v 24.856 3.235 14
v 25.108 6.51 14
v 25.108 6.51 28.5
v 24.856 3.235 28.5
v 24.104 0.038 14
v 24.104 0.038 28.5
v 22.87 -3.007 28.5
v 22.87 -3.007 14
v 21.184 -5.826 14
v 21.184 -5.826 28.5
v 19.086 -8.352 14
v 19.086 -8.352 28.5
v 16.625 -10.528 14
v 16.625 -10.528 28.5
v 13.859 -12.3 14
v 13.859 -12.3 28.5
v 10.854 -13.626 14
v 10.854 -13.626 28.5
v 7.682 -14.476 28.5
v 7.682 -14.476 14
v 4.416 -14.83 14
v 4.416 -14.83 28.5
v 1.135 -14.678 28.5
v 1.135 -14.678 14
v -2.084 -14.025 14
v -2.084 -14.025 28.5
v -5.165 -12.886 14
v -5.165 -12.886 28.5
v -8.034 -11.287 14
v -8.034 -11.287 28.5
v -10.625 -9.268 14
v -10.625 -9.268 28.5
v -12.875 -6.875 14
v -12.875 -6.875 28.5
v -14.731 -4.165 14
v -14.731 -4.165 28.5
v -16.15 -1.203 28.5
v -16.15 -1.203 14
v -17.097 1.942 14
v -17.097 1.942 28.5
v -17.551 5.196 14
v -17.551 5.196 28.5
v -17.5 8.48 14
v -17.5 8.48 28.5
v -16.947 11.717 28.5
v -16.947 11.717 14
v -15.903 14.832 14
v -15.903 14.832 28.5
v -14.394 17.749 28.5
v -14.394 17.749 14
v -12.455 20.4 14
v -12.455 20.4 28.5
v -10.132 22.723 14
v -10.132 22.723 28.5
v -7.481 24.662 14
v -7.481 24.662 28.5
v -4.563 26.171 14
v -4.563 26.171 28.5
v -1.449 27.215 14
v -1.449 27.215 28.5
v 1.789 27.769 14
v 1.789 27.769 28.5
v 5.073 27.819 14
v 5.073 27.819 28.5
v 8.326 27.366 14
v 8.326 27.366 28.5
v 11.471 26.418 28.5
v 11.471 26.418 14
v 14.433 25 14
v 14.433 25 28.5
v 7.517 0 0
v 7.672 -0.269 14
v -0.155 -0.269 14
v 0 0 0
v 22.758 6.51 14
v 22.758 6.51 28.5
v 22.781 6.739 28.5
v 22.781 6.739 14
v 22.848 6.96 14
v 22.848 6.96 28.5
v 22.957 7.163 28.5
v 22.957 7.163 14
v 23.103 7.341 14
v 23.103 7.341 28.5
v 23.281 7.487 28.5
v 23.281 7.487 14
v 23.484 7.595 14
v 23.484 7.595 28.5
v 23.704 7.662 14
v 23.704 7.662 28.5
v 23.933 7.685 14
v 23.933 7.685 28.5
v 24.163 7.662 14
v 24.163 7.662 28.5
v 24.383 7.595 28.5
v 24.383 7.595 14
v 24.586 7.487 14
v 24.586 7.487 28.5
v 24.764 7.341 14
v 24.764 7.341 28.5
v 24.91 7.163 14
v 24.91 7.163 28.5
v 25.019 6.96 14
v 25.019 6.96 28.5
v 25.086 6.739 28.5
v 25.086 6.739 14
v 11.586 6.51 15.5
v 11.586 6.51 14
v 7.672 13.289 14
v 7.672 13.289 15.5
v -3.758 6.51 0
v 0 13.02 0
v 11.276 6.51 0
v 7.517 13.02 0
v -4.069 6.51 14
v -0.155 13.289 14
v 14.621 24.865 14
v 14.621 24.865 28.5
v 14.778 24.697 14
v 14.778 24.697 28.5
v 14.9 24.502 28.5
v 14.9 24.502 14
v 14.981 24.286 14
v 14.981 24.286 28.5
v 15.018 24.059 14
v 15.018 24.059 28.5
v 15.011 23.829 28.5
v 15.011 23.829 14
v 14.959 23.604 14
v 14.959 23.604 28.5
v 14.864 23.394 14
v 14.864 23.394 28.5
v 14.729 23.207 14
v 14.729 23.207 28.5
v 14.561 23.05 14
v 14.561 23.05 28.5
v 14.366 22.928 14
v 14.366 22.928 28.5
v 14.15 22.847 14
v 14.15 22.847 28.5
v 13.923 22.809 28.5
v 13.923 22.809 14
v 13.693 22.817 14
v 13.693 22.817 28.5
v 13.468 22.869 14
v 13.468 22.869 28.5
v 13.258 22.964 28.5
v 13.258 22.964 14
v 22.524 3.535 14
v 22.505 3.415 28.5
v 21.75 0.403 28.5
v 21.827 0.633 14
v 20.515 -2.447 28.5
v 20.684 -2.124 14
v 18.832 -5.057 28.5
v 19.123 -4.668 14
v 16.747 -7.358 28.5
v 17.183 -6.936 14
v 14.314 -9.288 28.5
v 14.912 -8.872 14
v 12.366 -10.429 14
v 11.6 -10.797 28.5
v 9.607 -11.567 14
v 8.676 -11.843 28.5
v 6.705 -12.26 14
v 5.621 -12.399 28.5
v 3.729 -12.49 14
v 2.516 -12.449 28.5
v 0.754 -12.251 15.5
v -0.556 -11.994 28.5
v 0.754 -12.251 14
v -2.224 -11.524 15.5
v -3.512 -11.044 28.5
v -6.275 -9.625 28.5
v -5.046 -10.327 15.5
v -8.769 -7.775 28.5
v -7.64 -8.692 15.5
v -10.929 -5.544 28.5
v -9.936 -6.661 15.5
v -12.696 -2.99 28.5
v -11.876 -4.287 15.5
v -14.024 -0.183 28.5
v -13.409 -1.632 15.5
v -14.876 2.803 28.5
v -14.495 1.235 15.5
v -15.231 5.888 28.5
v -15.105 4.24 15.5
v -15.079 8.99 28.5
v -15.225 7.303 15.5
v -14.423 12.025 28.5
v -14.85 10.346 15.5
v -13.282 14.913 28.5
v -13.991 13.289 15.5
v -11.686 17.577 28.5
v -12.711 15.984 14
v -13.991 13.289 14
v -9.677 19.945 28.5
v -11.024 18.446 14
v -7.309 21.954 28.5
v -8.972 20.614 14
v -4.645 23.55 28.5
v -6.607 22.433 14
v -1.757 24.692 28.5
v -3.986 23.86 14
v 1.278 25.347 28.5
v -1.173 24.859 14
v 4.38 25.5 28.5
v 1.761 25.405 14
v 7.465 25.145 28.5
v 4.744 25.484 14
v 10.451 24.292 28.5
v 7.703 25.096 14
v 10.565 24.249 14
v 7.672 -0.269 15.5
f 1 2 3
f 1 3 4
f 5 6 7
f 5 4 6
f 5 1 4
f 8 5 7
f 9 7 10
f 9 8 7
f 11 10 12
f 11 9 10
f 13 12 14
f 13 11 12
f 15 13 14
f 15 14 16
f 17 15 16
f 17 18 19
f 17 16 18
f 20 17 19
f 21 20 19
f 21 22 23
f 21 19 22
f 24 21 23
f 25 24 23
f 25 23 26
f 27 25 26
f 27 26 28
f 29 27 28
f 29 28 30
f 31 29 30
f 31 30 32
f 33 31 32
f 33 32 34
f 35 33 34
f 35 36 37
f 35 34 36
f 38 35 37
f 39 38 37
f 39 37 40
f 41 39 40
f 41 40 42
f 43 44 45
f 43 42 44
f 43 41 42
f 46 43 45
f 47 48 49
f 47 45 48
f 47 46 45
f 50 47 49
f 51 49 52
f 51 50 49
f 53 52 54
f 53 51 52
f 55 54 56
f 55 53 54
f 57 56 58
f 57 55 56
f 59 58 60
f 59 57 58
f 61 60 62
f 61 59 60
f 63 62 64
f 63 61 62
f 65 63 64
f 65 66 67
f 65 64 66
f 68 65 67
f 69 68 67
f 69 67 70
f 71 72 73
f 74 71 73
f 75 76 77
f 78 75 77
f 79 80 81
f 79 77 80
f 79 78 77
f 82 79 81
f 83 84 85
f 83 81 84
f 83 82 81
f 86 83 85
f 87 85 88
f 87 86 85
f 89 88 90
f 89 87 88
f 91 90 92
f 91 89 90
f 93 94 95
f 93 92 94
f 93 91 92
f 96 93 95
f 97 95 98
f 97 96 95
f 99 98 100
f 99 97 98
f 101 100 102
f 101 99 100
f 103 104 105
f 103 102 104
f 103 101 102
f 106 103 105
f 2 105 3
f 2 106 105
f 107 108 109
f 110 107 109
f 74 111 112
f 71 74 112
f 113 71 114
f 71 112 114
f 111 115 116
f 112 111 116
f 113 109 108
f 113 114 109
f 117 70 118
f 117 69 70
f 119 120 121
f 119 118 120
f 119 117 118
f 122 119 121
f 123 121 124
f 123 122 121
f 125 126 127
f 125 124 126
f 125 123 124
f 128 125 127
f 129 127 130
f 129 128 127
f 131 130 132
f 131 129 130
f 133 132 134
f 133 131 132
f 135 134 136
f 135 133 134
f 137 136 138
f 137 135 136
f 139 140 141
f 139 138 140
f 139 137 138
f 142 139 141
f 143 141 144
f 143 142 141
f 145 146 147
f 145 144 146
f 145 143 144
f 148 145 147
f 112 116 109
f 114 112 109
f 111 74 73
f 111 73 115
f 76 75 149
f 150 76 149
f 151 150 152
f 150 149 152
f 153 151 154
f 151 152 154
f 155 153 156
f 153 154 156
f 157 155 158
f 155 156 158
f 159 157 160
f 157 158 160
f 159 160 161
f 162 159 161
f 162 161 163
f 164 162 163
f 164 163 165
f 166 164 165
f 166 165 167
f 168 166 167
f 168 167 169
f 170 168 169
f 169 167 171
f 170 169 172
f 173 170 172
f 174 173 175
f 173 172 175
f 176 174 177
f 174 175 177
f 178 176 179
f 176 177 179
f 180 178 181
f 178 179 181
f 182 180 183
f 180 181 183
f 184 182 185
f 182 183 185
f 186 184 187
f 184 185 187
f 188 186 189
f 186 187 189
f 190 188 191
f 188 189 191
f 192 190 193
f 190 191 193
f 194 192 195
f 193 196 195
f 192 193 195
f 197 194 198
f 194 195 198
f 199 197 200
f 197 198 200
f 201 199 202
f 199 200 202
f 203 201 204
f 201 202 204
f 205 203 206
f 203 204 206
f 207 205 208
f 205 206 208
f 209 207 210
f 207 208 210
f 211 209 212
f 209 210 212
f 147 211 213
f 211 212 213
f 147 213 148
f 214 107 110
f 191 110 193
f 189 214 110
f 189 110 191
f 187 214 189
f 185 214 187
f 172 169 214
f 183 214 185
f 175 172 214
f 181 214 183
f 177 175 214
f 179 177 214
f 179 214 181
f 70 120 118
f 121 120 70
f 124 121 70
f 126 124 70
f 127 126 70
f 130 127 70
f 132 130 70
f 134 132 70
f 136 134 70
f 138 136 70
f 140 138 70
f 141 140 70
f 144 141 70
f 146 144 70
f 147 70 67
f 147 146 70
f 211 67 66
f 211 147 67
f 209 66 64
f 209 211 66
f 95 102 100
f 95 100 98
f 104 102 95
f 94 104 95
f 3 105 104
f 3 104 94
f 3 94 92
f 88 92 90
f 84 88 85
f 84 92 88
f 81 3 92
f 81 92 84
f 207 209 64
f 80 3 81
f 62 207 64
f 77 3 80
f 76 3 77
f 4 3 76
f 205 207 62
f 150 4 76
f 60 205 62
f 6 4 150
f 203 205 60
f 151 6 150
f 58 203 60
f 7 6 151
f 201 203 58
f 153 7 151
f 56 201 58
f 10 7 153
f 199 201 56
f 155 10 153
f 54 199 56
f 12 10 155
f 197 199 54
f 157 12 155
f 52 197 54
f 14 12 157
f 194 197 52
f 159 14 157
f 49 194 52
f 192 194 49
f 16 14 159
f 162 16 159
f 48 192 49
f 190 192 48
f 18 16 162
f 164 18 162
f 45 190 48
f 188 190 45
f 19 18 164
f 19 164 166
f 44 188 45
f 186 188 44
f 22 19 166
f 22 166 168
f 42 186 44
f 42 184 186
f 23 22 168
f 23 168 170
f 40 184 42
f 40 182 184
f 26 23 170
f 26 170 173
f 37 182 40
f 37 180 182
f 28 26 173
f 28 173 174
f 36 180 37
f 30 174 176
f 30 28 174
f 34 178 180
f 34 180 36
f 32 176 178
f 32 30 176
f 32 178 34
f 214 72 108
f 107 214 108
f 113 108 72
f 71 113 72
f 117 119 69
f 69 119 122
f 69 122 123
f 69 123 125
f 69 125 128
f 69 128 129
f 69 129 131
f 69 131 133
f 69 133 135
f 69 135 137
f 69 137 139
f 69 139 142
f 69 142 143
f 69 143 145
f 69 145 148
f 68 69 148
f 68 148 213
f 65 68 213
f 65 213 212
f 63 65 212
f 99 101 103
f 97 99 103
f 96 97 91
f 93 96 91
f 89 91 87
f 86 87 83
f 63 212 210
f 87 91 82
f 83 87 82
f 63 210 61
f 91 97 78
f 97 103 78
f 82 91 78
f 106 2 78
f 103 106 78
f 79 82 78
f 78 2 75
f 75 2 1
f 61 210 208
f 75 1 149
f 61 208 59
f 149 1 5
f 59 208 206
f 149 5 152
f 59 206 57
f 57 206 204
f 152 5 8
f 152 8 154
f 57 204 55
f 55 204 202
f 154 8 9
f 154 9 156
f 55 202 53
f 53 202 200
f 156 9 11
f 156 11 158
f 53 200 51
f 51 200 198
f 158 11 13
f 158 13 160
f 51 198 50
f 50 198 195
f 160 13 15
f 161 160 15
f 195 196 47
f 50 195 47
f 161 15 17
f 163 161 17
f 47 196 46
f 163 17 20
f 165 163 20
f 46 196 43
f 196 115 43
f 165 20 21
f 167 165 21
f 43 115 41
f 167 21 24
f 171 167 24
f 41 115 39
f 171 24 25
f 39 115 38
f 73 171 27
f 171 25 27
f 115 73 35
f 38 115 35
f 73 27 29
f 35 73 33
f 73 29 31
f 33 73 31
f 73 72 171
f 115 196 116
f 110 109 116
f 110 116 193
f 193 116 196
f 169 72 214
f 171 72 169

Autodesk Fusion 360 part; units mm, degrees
sketch "Sketch1" plane through (0, 0, 0) normal (0, 0, 1) x (1, 0, 0)
  line L0 (0, 0) -> (-3.7585, 6.5099)
  line L1 (-3.7585, 6.5099) -> (0, 13.0198)
  line L2 (0, 13.0198) -> (7.517, 13.0198)
  line L3 (7.517, 13.0198) -> (11.2755, 6.5099)
  line L4 (11.2755, 6.5099) -> (7.517, 0)
  line L5 (7.517, 0) -> (0, 0)
  dimension "d1" = 120
  dimension "d2" = 120
  dimension "d3" = 7.517
  dimension "d4" = 7.517
  dimension "d5" = 7.517
  dimension "d6" = 7.517
extrude "Extrude1" add sketch "Sketch1" along normal blind 14 draft 1.1
sketch "Sketch2" plane through (0, 0, 14) normal (0, 0, 1) x (-1, 0, 0)
  line L0 (0.1552, 0.2688) -> (-7.6722, 0.2688)
  line L1 (-7.6722, 0.2688) -> (-11.5859, -6.5099)
  line L2 (-11.5859, -6.5099) -> (-7.6722, -13.2886)
  line L3 (-7.6722, -13.2886) -> (0.1552, -13.2886)
  line L4 (0.1552, -13.2886) -> (4.0689, -6.5099)
  line L5 (4.0689, -6.5099) -> (0.1552, 0.2688)
  line L6 (0.1552, -13.2886) -> (-7.6722, 0.2688)
  line L7 (4.0689, -6.5099) -> (-11.5859, -6.5099)
  line L8 (-7.6722, -13.2886) -> (0.1552, 0.2688)
  circle A0 centre (-3.7585, -6.5099) radius 19
  circle A1 centre (-3.7585, -6.5099) radius 21.3499
  line L9 (5.0153, -25.9737) -> (5.8455, -26.0477)
  line L10 (4.3962, -24.2552) -> (5.1351, -23.2999)
  line L11 (-3.7585, -6.5099) -> (-3.7585, -7)
  line L12 (-13.3271, -26.7079) -> (-13.2828, -26.7025)
  line L13 (-12.3737, -24.5944) -> (-12.4136, -24.5402)
  line L14 (-3.7585, -6.5099) -> (-25.1084, -6.5099)
  line L15 (-3.7585, -6.5099) -> (-14.4334, -24.9995)
  arc A2 (-13.2585, -22.9644) -> (-14.4334, -24.9995) centre (-13.846, -23.9819) ccw
  arc A3 (-25.1084, -6.5099) -> (-22.7585, -6.5099) centre (-23.9334, -6.5099) ccw
  line L16 (-11.5859, -6.5099) -> (-0.7542, 12.2511)
  line L17 (-7.6722, -13.2886) -> (13.9911, -13.2886)
  dimension "d9" = 38
  dimension "d10" = 2.3499
extrude "Extrude2" add sketch "Sketch2" along normal blind 1.5 contours L0 L6 L8 | L0 L4 L5 A0 L16 L17 | L5 L7 L8 | L1 L6 L7 L14 L16 | L4 L6 L7 | L2 L7 L8 L14 L15 | L3 L6 L8 L15 L17 | A0 A1 L14 L15 | L14 A3 | L15 A2
extrude "Extrude3" add sketch "Sketch2" along normal blind 14.5 contours A0 A1 L14 L15 | L14 A3 | L15 A2
equation "d2 = d1"
equation "d4 = d3"
equation "d5 = d3"
equation "d6 = d3"
